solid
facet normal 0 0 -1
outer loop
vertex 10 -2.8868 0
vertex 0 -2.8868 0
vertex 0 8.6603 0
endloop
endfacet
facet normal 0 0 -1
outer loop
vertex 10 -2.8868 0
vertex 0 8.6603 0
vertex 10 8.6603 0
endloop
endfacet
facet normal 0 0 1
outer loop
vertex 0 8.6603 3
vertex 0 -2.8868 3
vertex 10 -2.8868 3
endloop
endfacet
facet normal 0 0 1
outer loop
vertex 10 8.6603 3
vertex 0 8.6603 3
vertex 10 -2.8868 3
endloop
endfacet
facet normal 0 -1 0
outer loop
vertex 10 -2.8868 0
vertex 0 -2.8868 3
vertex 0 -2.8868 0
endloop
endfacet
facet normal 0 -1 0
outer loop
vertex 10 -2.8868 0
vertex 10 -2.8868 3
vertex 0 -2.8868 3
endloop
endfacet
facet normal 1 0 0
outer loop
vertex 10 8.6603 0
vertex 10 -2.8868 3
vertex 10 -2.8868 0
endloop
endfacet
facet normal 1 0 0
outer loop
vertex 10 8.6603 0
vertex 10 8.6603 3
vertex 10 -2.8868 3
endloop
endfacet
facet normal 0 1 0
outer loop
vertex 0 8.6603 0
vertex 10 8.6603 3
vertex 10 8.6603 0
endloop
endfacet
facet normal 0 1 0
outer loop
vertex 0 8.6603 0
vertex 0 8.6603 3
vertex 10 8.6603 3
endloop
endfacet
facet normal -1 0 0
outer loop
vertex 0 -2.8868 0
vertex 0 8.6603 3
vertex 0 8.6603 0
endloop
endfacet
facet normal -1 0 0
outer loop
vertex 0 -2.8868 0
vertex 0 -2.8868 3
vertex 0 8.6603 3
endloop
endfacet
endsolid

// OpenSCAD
linear_extrude(3) projection(cut = true) translate([0, 0, -5]) rotate([30, 0, 0]) cube(10);
